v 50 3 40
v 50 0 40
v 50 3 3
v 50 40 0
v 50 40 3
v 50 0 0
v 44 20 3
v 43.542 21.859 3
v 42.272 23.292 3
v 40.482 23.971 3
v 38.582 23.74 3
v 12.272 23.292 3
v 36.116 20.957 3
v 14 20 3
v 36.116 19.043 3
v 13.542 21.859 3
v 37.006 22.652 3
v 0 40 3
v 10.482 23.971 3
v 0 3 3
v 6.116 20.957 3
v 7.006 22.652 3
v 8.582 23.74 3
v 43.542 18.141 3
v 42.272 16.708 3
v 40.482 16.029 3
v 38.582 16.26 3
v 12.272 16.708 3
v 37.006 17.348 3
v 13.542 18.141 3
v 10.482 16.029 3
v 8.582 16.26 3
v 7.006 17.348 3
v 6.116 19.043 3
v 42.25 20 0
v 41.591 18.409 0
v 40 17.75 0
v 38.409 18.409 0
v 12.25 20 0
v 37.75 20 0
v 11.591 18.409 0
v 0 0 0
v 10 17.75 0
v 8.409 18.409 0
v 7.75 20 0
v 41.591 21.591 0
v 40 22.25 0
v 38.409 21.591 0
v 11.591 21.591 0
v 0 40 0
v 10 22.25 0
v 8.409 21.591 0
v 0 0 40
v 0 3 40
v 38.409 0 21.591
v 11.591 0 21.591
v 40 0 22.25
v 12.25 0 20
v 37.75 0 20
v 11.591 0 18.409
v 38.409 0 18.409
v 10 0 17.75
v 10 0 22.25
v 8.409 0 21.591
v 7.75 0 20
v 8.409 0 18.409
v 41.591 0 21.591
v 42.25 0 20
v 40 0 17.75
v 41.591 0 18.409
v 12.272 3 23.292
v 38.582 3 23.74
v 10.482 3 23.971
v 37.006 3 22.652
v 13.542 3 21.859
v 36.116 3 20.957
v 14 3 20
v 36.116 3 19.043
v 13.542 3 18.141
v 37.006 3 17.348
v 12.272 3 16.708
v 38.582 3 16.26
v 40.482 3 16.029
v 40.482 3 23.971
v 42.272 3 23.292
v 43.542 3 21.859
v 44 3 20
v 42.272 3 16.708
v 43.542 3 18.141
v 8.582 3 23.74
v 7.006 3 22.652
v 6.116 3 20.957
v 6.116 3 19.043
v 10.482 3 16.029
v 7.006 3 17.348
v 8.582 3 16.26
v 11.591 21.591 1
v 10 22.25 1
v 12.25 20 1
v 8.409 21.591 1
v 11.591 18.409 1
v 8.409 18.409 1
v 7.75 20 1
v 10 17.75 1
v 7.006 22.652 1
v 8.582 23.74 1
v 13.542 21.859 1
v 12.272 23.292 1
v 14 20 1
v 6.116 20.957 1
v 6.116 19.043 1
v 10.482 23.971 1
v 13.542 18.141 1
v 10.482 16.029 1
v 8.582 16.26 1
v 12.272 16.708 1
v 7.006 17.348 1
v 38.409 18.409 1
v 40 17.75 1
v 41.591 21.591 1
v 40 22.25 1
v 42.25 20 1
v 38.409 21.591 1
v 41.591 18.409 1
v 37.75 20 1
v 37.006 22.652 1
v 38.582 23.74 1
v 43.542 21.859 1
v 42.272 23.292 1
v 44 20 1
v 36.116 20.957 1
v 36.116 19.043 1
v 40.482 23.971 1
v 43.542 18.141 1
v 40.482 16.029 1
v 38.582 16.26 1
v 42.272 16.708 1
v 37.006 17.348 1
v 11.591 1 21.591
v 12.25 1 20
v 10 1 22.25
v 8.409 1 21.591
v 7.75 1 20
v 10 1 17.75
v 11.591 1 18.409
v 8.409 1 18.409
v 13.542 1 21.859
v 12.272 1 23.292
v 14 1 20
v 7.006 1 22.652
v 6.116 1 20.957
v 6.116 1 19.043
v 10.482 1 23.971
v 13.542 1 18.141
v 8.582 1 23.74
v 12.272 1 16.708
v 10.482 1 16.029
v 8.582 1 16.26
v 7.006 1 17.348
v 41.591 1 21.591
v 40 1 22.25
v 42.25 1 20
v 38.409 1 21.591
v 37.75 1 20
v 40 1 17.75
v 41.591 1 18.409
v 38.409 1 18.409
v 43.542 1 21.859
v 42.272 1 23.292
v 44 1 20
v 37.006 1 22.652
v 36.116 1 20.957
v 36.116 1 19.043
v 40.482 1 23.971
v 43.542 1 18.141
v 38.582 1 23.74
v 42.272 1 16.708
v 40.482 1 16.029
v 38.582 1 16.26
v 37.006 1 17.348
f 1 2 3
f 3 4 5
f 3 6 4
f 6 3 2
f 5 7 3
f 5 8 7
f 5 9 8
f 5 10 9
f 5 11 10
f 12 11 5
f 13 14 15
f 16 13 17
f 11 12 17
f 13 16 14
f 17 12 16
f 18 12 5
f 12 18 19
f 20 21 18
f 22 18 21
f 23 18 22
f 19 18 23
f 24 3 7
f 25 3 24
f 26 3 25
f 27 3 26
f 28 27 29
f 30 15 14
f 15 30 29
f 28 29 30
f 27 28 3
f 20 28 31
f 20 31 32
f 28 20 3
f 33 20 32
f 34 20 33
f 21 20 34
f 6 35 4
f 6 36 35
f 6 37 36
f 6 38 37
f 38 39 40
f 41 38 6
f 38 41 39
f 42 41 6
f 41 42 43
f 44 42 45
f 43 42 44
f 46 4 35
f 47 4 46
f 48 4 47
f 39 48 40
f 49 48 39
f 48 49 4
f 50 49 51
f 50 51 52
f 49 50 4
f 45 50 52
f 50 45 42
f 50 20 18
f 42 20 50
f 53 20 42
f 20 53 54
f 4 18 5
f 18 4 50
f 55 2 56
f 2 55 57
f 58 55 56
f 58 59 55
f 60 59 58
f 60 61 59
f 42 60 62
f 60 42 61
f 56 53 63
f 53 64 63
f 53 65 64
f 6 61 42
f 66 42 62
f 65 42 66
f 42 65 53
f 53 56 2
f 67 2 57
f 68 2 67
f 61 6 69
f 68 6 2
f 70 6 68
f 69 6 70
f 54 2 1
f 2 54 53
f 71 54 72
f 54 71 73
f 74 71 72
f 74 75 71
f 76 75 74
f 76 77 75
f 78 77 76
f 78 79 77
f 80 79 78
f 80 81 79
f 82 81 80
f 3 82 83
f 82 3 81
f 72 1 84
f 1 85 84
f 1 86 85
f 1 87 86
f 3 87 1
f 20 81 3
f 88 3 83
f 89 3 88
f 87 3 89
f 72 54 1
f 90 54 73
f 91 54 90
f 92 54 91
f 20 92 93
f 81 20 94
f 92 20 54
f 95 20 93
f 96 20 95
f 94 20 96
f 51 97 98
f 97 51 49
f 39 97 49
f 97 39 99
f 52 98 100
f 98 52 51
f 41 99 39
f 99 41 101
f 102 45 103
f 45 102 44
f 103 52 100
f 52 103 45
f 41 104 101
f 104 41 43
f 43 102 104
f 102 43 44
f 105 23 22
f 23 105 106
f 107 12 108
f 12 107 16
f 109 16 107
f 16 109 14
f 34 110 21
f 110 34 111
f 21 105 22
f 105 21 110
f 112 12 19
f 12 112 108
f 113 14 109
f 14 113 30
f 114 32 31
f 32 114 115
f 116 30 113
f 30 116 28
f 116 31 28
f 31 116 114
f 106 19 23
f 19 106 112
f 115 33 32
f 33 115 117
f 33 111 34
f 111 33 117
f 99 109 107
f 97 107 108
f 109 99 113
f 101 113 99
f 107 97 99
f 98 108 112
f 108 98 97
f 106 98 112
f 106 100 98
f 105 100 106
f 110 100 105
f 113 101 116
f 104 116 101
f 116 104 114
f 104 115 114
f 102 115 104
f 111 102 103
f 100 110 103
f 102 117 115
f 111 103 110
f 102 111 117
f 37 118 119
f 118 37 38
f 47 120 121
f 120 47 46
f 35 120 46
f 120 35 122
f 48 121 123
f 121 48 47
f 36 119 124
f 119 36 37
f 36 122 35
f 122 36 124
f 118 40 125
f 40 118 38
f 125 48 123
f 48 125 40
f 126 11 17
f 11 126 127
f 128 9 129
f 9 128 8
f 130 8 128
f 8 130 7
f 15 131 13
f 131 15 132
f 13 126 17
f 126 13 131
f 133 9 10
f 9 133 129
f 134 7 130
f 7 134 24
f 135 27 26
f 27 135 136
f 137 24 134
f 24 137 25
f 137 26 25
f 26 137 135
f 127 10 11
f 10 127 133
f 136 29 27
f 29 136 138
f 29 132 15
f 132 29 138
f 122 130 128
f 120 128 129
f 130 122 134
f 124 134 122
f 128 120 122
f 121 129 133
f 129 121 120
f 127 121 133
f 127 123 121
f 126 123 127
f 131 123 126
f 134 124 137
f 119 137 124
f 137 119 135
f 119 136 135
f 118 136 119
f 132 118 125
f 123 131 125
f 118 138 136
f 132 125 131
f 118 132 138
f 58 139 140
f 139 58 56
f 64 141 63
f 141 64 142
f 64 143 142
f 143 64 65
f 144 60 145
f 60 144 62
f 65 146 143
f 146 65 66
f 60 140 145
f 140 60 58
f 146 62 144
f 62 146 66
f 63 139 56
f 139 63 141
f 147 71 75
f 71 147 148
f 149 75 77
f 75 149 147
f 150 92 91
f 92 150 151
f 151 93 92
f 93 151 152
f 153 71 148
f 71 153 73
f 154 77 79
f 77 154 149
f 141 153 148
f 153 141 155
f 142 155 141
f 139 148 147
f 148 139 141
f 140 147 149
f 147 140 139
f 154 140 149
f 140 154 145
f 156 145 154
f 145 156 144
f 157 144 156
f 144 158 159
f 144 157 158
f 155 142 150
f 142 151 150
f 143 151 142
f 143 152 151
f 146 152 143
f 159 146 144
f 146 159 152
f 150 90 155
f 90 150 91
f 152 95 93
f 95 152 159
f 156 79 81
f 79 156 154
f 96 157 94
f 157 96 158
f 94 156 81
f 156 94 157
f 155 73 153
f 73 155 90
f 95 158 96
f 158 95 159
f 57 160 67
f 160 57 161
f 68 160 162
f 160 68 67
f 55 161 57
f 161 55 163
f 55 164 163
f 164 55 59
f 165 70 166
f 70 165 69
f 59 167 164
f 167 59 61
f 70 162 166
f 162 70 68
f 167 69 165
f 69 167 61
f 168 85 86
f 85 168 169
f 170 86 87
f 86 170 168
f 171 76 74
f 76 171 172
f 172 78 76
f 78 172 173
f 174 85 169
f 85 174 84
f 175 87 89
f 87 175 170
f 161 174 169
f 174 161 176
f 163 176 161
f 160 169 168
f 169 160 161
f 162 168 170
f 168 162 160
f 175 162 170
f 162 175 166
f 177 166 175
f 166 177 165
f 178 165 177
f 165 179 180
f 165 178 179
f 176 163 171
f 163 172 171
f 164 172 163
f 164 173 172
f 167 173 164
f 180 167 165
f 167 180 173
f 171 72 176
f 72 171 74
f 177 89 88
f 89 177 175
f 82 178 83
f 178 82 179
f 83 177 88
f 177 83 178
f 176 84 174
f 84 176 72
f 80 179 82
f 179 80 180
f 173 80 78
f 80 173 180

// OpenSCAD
// L字金具 (L-bracket)
w        = 50;   // 幅
d        = 40;   // 奥行き
h        = 40;   // 高さ
t        = 3;    // 板厚
hole_d   = 4.5;  // 貫通穴径
cs_d     = 8;    // 皿座面径
cs_depth = 2;    // 皿座面深さ
offset   = 10;   // 縁からの距離

module bracket() {
    difference() {
        // 板本体
        union() {
            // 水平フランジ
            cube([w, d, t]);
            // 垂直フランジ
            cube([w, t, h]);
        }
        // 水平フランジの穴
        for (x_pos = [offset, w - offset]) {
            // 貫通穴
            translate([x_pos, d/2, t/2])
                cylinder(d = hole_d, h = t + 2, center = true);
            // 皿穴 (外側=+Z側)
            translate([x_pos, d/2, t - cs_depth/2])
                cylinder(d = cs_d, h = cs_depth, center = true);
        }
        // 垂直フランジの穴
        for (x_pos = [offset, w - offset]) {
            // 貫通穴
            translate([x_pos, t/2, h/2])
                rotate([90, 0, 0])
                    cylinder(d = hole_d, h = t + 2, center = true);
            // 皿穴 (外側=+Y側)
            translate([x_pos, t - cs_depth/2, h/2])
                rotate([90, 0, 0])
                    cylinder(d = cs_d, h = cs_depth, center = true);
        }
    }
}

bracket();
